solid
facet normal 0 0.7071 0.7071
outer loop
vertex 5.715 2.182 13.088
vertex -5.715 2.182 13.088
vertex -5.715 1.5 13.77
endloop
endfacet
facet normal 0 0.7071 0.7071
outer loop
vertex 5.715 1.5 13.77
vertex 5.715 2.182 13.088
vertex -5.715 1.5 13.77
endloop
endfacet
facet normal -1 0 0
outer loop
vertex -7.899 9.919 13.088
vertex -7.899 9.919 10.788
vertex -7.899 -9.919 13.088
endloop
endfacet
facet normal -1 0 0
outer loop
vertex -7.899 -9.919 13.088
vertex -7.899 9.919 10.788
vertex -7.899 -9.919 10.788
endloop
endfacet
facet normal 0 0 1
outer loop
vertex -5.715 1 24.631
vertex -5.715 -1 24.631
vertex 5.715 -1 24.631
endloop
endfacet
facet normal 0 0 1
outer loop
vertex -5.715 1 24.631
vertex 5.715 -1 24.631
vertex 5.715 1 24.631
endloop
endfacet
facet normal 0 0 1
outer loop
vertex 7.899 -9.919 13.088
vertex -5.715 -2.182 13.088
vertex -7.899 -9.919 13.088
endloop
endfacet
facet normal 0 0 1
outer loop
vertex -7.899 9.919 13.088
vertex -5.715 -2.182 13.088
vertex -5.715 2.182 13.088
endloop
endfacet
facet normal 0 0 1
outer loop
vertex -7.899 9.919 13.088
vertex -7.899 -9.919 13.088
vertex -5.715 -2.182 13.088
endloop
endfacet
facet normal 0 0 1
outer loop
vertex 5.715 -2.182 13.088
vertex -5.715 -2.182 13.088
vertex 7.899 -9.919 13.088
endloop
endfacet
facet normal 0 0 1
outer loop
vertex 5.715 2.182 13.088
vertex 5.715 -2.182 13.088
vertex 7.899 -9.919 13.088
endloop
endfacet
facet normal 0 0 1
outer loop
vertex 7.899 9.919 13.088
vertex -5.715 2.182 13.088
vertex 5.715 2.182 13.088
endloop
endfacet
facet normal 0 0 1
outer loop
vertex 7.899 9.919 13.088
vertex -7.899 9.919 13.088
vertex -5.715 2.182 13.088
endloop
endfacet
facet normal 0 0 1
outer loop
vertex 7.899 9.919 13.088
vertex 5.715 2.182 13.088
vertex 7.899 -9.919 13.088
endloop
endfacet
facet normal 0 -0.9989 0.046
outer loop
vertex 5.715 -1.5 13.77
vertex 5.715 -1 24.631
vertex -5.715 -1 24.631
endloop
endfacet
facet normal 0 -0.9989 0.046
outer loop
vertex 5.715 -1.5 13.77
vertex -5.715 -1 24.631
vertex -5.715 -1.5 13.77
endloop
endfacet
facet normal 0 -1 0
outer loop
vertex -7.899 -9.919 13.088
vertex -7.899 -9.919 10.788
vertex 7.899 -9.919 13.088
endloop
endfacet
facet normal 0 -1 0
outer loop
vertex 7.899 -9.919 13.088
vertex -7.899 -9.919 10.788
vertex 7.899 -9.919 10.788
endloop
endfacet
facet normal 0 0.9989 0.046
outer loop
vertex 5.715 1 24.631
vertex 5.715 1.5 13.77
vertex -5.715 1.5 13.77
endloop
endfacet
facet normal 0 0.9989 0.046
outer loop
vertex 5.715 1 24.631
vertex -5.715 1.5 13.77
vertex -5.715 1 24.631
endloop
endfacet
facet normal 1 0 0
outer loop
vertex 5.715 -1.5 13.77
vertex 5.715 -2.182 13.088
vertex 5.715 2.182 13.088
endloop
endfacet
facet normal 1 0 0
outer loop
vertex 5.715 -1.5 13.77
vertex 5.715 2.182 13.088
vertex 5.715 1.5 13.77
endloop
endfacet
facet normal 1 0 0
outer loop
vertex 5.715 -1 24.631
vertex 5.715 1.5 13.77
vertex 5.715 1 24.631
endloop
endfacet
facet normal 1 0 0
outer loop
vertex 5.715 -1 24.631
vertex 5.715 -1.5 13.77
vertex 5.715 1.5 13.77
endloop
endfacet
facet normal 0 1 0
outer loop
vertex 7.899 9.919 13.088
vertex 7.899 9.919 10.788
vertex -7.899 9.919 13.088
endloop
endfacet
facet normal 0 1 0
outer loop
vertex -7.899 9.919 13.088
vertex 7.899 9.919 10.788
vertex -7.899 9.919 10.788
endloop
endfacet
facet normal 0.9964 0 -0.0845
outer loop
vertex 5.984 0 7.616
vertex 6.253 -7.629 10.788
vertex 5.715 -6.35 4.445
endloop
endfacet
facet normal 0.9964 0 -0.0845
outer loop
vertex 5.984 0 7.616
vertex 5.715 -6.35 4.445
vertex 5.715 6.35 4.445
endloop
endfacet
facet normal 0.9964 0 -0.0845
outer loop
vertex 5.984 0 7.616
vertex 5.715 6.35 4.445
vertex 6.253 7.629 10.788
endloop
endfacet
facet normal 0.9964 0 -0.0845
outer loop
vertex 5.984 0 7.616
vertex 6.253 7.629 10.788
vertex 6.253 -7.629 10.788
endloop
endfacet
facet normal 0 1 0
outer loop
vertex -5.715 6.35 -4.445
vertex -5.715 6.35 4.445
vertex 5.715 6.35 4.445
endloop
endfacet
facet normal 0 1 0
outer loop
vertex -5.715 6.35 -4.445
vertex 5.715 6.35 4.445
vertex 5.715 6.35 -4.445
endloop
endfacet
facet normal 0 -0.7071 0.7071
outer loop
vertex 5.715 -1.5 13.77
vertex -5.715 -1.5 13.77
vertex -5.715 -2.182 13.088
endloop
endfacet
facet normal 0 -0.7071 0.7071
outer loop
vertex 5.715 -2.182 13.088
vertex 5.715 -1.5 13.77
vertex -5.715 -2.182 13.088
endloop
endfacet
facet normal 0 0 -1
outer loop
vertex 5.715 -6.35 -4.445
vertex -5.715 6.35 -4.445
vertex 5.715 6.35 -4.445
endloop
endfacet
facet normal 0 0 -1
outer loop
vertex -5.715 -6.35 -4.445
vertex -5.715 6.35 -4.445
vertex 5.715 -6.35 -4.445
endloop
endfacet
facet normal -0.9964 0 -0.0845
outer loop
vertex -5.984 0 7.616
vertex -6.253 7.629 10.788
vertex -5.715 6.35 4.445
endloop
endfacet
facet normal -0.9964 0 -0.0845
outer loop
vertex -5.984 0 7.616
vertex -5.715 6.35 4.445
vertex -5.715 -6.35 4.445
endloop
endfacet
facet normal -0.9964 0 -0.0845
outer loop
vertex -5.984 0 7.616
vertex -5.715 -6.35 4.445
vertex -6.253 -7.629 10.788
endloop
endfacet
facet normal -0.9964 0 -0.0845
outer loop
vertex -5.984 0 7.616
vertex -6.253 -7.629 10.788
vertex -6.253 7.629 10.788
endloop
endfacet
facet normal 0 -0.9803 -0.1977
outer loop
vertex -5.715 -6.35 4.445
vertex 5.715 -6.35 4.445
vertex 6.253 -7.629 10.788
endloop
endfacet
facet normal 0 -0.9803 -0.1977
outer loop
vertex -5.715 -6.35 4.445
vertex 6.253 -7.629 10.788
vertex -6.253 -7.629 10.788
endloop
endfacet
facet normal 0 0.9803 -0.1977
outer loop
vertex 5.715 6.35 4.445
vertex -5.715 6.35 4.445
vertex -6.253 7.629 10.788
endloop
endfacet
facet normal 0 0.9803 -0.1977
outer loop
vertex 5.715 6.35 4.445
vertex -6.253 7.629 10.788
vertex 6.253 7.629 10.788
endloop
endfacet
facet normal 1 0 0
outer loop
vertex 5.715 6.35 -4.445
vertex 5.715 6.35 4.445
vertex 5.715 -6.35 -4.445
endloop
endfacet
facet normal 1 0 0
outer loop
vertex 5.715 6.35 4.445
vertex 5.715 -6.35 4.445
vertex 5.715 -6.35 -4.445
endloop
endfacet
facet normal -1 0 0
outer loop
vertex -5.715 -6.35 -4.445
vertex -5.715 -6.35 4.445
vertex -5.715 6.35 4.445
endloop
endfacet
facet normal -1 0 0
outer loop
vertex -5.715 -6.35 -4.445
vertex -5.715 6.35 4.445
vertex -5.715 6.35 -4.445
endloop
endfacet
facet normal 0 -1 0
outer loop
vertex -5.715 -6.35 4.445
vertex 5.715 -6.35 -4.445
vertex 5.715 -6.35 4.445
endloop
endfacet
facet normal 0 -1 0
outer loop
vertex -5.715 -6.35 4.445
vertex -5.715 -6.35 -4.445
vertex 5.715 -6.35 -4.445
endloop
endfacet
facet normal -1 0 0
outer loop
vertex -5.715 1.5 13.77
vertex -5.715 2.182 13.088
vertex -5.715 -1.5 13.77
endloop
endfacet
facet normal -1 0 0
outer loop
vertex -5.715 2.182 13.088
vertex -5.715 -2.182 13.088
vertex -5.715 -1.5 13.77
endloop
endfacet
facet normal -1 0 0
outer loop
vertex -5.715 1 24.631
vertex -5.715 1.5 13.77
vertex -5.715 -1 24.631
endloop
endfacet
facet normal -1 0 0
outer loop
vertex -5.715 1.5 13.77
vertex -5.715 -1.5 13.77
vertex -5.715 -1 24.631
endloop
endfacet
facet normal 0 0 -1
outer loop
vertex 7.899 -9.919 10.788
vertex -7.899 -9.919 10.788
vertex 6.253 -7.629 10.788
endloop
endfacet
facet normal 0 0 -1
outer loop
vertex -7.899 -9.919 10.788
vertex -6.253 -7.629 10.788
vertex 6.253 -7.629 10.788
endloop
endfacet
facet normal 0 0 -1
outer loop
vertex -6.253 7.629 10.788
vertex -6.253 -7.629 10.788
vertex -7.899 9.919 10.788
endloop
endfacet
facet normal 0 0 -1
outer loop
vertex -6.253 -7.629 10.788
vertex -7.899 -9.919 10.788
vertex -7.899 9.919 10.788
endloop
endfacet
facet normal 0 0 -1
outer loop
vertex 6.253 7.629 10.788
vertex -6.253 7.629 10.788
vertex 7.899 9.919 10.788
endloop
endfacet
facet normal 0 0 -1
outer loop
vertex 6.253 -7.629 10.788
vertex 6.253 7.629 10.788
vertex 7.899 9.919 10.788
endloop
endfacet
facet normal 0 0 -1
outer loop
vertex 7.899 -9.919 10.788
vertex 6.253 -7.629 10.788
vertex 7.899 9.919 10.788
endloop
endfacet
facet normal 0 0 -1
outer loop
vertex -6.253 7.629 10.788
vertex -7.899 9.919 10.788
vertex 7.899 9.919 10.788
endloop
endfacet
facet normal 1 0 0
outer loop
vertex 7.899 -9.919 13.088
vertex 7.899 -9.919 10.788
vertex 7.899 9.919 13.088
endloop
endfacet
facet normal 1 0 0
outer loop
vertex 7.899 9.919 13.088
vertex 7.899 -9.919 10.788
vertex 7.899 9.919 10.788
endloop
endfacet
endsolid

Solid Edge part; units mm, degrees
sketch "Sketch1" plane through (0, 0, 0) normal (1, 0, 0) x (0, 1, 0)
  line L0 (-6.35, -4.445) -> (-6.35, 4.445)
  line L1 (-6.35, 4.445) -> (6.35, 4.445)
  line L2 (6.35, 4.445) -> (6.35, -4.445)
  line L3 (6.35, -4.445) -> (-6.35, -4.445)
extrude "Protrusion1" add sketch "Sketch1" along normal mid plane 11.43
sketch "Sketch2" plane through (0, 0, 11.938) normal (0, 0, 1) x (1, 0, 0)
  line L0 (6.35, -7.8613) -> (-6.35, -7.8613)
  line L1 (-6.35, -7.8613) -> (-6.35, 7.8613)
  line L2 (-6.35, 7.8613) -> (6.35, 7.8613)
  line L3 (6.35, 7.8613) -> (6.35, -7.8613)
  dimension "D1" = 12.7
  dimension "D2" = 15.7226
sketch "Sketch3" plane through (0, 0, 4.445) normal (0, 0, 1) x (0, -1, 0)
  line L0 (6.35, 5.715) -> (-6.35, 5.715)
  line L1 (-6.35, 5.715) -> (-6.35, -5.715)
  line L2 (6.35, -5.715) -> (-6.35, -5.715)
  line L3 (6.35, 5.715) -> (6.35, -5.715)
loft "LoftedProtrusion1" add profiles "Sketch2", "Sketch3"
sketch "Sketch4" plane through (0, 0, 11.938) normal (0, 0, 1) x (-1, 0, 0)
  line L0 (-7.8994, 9.9187) -> (-7.8994, -9.9187)
  line L1 (-7.8994, -9.9187) -> (7.8994, -9.9187)
  line L2 (7.8994, -9.9187) -> (7.8994, 9.9187)
  line L3 (7.8994, 9.9187) -> (-7.8994, 9.9187)
extrude "ExtrudedProtrusion_2" add sketch "Sketch4" along normal mid plane 2.3
sketch "Sketch5" plane through (0, 0, 0) normal (1, 0, 0) x (0, 1, 0)
  line L0 (-1, 24.631) -> (-1.5, 13.7696)
  line L1 (-1.5, 13.7696) -> (-2.1816, 13.088)
  line L2 (-2.1816, 13.088) -> (2.1816, 13.088)
  line L3 (2.1816, 13.088) -> (1.5, 13.7696)
  line L4 (1.5, 13.7696) -> (1, 24.631)
  line L5 (-1, 24.631) -> (1, 24.631)
extrude "ExtrudedProtrusion_3" add sketch "Sketch5" along normal mid plane 11.43
